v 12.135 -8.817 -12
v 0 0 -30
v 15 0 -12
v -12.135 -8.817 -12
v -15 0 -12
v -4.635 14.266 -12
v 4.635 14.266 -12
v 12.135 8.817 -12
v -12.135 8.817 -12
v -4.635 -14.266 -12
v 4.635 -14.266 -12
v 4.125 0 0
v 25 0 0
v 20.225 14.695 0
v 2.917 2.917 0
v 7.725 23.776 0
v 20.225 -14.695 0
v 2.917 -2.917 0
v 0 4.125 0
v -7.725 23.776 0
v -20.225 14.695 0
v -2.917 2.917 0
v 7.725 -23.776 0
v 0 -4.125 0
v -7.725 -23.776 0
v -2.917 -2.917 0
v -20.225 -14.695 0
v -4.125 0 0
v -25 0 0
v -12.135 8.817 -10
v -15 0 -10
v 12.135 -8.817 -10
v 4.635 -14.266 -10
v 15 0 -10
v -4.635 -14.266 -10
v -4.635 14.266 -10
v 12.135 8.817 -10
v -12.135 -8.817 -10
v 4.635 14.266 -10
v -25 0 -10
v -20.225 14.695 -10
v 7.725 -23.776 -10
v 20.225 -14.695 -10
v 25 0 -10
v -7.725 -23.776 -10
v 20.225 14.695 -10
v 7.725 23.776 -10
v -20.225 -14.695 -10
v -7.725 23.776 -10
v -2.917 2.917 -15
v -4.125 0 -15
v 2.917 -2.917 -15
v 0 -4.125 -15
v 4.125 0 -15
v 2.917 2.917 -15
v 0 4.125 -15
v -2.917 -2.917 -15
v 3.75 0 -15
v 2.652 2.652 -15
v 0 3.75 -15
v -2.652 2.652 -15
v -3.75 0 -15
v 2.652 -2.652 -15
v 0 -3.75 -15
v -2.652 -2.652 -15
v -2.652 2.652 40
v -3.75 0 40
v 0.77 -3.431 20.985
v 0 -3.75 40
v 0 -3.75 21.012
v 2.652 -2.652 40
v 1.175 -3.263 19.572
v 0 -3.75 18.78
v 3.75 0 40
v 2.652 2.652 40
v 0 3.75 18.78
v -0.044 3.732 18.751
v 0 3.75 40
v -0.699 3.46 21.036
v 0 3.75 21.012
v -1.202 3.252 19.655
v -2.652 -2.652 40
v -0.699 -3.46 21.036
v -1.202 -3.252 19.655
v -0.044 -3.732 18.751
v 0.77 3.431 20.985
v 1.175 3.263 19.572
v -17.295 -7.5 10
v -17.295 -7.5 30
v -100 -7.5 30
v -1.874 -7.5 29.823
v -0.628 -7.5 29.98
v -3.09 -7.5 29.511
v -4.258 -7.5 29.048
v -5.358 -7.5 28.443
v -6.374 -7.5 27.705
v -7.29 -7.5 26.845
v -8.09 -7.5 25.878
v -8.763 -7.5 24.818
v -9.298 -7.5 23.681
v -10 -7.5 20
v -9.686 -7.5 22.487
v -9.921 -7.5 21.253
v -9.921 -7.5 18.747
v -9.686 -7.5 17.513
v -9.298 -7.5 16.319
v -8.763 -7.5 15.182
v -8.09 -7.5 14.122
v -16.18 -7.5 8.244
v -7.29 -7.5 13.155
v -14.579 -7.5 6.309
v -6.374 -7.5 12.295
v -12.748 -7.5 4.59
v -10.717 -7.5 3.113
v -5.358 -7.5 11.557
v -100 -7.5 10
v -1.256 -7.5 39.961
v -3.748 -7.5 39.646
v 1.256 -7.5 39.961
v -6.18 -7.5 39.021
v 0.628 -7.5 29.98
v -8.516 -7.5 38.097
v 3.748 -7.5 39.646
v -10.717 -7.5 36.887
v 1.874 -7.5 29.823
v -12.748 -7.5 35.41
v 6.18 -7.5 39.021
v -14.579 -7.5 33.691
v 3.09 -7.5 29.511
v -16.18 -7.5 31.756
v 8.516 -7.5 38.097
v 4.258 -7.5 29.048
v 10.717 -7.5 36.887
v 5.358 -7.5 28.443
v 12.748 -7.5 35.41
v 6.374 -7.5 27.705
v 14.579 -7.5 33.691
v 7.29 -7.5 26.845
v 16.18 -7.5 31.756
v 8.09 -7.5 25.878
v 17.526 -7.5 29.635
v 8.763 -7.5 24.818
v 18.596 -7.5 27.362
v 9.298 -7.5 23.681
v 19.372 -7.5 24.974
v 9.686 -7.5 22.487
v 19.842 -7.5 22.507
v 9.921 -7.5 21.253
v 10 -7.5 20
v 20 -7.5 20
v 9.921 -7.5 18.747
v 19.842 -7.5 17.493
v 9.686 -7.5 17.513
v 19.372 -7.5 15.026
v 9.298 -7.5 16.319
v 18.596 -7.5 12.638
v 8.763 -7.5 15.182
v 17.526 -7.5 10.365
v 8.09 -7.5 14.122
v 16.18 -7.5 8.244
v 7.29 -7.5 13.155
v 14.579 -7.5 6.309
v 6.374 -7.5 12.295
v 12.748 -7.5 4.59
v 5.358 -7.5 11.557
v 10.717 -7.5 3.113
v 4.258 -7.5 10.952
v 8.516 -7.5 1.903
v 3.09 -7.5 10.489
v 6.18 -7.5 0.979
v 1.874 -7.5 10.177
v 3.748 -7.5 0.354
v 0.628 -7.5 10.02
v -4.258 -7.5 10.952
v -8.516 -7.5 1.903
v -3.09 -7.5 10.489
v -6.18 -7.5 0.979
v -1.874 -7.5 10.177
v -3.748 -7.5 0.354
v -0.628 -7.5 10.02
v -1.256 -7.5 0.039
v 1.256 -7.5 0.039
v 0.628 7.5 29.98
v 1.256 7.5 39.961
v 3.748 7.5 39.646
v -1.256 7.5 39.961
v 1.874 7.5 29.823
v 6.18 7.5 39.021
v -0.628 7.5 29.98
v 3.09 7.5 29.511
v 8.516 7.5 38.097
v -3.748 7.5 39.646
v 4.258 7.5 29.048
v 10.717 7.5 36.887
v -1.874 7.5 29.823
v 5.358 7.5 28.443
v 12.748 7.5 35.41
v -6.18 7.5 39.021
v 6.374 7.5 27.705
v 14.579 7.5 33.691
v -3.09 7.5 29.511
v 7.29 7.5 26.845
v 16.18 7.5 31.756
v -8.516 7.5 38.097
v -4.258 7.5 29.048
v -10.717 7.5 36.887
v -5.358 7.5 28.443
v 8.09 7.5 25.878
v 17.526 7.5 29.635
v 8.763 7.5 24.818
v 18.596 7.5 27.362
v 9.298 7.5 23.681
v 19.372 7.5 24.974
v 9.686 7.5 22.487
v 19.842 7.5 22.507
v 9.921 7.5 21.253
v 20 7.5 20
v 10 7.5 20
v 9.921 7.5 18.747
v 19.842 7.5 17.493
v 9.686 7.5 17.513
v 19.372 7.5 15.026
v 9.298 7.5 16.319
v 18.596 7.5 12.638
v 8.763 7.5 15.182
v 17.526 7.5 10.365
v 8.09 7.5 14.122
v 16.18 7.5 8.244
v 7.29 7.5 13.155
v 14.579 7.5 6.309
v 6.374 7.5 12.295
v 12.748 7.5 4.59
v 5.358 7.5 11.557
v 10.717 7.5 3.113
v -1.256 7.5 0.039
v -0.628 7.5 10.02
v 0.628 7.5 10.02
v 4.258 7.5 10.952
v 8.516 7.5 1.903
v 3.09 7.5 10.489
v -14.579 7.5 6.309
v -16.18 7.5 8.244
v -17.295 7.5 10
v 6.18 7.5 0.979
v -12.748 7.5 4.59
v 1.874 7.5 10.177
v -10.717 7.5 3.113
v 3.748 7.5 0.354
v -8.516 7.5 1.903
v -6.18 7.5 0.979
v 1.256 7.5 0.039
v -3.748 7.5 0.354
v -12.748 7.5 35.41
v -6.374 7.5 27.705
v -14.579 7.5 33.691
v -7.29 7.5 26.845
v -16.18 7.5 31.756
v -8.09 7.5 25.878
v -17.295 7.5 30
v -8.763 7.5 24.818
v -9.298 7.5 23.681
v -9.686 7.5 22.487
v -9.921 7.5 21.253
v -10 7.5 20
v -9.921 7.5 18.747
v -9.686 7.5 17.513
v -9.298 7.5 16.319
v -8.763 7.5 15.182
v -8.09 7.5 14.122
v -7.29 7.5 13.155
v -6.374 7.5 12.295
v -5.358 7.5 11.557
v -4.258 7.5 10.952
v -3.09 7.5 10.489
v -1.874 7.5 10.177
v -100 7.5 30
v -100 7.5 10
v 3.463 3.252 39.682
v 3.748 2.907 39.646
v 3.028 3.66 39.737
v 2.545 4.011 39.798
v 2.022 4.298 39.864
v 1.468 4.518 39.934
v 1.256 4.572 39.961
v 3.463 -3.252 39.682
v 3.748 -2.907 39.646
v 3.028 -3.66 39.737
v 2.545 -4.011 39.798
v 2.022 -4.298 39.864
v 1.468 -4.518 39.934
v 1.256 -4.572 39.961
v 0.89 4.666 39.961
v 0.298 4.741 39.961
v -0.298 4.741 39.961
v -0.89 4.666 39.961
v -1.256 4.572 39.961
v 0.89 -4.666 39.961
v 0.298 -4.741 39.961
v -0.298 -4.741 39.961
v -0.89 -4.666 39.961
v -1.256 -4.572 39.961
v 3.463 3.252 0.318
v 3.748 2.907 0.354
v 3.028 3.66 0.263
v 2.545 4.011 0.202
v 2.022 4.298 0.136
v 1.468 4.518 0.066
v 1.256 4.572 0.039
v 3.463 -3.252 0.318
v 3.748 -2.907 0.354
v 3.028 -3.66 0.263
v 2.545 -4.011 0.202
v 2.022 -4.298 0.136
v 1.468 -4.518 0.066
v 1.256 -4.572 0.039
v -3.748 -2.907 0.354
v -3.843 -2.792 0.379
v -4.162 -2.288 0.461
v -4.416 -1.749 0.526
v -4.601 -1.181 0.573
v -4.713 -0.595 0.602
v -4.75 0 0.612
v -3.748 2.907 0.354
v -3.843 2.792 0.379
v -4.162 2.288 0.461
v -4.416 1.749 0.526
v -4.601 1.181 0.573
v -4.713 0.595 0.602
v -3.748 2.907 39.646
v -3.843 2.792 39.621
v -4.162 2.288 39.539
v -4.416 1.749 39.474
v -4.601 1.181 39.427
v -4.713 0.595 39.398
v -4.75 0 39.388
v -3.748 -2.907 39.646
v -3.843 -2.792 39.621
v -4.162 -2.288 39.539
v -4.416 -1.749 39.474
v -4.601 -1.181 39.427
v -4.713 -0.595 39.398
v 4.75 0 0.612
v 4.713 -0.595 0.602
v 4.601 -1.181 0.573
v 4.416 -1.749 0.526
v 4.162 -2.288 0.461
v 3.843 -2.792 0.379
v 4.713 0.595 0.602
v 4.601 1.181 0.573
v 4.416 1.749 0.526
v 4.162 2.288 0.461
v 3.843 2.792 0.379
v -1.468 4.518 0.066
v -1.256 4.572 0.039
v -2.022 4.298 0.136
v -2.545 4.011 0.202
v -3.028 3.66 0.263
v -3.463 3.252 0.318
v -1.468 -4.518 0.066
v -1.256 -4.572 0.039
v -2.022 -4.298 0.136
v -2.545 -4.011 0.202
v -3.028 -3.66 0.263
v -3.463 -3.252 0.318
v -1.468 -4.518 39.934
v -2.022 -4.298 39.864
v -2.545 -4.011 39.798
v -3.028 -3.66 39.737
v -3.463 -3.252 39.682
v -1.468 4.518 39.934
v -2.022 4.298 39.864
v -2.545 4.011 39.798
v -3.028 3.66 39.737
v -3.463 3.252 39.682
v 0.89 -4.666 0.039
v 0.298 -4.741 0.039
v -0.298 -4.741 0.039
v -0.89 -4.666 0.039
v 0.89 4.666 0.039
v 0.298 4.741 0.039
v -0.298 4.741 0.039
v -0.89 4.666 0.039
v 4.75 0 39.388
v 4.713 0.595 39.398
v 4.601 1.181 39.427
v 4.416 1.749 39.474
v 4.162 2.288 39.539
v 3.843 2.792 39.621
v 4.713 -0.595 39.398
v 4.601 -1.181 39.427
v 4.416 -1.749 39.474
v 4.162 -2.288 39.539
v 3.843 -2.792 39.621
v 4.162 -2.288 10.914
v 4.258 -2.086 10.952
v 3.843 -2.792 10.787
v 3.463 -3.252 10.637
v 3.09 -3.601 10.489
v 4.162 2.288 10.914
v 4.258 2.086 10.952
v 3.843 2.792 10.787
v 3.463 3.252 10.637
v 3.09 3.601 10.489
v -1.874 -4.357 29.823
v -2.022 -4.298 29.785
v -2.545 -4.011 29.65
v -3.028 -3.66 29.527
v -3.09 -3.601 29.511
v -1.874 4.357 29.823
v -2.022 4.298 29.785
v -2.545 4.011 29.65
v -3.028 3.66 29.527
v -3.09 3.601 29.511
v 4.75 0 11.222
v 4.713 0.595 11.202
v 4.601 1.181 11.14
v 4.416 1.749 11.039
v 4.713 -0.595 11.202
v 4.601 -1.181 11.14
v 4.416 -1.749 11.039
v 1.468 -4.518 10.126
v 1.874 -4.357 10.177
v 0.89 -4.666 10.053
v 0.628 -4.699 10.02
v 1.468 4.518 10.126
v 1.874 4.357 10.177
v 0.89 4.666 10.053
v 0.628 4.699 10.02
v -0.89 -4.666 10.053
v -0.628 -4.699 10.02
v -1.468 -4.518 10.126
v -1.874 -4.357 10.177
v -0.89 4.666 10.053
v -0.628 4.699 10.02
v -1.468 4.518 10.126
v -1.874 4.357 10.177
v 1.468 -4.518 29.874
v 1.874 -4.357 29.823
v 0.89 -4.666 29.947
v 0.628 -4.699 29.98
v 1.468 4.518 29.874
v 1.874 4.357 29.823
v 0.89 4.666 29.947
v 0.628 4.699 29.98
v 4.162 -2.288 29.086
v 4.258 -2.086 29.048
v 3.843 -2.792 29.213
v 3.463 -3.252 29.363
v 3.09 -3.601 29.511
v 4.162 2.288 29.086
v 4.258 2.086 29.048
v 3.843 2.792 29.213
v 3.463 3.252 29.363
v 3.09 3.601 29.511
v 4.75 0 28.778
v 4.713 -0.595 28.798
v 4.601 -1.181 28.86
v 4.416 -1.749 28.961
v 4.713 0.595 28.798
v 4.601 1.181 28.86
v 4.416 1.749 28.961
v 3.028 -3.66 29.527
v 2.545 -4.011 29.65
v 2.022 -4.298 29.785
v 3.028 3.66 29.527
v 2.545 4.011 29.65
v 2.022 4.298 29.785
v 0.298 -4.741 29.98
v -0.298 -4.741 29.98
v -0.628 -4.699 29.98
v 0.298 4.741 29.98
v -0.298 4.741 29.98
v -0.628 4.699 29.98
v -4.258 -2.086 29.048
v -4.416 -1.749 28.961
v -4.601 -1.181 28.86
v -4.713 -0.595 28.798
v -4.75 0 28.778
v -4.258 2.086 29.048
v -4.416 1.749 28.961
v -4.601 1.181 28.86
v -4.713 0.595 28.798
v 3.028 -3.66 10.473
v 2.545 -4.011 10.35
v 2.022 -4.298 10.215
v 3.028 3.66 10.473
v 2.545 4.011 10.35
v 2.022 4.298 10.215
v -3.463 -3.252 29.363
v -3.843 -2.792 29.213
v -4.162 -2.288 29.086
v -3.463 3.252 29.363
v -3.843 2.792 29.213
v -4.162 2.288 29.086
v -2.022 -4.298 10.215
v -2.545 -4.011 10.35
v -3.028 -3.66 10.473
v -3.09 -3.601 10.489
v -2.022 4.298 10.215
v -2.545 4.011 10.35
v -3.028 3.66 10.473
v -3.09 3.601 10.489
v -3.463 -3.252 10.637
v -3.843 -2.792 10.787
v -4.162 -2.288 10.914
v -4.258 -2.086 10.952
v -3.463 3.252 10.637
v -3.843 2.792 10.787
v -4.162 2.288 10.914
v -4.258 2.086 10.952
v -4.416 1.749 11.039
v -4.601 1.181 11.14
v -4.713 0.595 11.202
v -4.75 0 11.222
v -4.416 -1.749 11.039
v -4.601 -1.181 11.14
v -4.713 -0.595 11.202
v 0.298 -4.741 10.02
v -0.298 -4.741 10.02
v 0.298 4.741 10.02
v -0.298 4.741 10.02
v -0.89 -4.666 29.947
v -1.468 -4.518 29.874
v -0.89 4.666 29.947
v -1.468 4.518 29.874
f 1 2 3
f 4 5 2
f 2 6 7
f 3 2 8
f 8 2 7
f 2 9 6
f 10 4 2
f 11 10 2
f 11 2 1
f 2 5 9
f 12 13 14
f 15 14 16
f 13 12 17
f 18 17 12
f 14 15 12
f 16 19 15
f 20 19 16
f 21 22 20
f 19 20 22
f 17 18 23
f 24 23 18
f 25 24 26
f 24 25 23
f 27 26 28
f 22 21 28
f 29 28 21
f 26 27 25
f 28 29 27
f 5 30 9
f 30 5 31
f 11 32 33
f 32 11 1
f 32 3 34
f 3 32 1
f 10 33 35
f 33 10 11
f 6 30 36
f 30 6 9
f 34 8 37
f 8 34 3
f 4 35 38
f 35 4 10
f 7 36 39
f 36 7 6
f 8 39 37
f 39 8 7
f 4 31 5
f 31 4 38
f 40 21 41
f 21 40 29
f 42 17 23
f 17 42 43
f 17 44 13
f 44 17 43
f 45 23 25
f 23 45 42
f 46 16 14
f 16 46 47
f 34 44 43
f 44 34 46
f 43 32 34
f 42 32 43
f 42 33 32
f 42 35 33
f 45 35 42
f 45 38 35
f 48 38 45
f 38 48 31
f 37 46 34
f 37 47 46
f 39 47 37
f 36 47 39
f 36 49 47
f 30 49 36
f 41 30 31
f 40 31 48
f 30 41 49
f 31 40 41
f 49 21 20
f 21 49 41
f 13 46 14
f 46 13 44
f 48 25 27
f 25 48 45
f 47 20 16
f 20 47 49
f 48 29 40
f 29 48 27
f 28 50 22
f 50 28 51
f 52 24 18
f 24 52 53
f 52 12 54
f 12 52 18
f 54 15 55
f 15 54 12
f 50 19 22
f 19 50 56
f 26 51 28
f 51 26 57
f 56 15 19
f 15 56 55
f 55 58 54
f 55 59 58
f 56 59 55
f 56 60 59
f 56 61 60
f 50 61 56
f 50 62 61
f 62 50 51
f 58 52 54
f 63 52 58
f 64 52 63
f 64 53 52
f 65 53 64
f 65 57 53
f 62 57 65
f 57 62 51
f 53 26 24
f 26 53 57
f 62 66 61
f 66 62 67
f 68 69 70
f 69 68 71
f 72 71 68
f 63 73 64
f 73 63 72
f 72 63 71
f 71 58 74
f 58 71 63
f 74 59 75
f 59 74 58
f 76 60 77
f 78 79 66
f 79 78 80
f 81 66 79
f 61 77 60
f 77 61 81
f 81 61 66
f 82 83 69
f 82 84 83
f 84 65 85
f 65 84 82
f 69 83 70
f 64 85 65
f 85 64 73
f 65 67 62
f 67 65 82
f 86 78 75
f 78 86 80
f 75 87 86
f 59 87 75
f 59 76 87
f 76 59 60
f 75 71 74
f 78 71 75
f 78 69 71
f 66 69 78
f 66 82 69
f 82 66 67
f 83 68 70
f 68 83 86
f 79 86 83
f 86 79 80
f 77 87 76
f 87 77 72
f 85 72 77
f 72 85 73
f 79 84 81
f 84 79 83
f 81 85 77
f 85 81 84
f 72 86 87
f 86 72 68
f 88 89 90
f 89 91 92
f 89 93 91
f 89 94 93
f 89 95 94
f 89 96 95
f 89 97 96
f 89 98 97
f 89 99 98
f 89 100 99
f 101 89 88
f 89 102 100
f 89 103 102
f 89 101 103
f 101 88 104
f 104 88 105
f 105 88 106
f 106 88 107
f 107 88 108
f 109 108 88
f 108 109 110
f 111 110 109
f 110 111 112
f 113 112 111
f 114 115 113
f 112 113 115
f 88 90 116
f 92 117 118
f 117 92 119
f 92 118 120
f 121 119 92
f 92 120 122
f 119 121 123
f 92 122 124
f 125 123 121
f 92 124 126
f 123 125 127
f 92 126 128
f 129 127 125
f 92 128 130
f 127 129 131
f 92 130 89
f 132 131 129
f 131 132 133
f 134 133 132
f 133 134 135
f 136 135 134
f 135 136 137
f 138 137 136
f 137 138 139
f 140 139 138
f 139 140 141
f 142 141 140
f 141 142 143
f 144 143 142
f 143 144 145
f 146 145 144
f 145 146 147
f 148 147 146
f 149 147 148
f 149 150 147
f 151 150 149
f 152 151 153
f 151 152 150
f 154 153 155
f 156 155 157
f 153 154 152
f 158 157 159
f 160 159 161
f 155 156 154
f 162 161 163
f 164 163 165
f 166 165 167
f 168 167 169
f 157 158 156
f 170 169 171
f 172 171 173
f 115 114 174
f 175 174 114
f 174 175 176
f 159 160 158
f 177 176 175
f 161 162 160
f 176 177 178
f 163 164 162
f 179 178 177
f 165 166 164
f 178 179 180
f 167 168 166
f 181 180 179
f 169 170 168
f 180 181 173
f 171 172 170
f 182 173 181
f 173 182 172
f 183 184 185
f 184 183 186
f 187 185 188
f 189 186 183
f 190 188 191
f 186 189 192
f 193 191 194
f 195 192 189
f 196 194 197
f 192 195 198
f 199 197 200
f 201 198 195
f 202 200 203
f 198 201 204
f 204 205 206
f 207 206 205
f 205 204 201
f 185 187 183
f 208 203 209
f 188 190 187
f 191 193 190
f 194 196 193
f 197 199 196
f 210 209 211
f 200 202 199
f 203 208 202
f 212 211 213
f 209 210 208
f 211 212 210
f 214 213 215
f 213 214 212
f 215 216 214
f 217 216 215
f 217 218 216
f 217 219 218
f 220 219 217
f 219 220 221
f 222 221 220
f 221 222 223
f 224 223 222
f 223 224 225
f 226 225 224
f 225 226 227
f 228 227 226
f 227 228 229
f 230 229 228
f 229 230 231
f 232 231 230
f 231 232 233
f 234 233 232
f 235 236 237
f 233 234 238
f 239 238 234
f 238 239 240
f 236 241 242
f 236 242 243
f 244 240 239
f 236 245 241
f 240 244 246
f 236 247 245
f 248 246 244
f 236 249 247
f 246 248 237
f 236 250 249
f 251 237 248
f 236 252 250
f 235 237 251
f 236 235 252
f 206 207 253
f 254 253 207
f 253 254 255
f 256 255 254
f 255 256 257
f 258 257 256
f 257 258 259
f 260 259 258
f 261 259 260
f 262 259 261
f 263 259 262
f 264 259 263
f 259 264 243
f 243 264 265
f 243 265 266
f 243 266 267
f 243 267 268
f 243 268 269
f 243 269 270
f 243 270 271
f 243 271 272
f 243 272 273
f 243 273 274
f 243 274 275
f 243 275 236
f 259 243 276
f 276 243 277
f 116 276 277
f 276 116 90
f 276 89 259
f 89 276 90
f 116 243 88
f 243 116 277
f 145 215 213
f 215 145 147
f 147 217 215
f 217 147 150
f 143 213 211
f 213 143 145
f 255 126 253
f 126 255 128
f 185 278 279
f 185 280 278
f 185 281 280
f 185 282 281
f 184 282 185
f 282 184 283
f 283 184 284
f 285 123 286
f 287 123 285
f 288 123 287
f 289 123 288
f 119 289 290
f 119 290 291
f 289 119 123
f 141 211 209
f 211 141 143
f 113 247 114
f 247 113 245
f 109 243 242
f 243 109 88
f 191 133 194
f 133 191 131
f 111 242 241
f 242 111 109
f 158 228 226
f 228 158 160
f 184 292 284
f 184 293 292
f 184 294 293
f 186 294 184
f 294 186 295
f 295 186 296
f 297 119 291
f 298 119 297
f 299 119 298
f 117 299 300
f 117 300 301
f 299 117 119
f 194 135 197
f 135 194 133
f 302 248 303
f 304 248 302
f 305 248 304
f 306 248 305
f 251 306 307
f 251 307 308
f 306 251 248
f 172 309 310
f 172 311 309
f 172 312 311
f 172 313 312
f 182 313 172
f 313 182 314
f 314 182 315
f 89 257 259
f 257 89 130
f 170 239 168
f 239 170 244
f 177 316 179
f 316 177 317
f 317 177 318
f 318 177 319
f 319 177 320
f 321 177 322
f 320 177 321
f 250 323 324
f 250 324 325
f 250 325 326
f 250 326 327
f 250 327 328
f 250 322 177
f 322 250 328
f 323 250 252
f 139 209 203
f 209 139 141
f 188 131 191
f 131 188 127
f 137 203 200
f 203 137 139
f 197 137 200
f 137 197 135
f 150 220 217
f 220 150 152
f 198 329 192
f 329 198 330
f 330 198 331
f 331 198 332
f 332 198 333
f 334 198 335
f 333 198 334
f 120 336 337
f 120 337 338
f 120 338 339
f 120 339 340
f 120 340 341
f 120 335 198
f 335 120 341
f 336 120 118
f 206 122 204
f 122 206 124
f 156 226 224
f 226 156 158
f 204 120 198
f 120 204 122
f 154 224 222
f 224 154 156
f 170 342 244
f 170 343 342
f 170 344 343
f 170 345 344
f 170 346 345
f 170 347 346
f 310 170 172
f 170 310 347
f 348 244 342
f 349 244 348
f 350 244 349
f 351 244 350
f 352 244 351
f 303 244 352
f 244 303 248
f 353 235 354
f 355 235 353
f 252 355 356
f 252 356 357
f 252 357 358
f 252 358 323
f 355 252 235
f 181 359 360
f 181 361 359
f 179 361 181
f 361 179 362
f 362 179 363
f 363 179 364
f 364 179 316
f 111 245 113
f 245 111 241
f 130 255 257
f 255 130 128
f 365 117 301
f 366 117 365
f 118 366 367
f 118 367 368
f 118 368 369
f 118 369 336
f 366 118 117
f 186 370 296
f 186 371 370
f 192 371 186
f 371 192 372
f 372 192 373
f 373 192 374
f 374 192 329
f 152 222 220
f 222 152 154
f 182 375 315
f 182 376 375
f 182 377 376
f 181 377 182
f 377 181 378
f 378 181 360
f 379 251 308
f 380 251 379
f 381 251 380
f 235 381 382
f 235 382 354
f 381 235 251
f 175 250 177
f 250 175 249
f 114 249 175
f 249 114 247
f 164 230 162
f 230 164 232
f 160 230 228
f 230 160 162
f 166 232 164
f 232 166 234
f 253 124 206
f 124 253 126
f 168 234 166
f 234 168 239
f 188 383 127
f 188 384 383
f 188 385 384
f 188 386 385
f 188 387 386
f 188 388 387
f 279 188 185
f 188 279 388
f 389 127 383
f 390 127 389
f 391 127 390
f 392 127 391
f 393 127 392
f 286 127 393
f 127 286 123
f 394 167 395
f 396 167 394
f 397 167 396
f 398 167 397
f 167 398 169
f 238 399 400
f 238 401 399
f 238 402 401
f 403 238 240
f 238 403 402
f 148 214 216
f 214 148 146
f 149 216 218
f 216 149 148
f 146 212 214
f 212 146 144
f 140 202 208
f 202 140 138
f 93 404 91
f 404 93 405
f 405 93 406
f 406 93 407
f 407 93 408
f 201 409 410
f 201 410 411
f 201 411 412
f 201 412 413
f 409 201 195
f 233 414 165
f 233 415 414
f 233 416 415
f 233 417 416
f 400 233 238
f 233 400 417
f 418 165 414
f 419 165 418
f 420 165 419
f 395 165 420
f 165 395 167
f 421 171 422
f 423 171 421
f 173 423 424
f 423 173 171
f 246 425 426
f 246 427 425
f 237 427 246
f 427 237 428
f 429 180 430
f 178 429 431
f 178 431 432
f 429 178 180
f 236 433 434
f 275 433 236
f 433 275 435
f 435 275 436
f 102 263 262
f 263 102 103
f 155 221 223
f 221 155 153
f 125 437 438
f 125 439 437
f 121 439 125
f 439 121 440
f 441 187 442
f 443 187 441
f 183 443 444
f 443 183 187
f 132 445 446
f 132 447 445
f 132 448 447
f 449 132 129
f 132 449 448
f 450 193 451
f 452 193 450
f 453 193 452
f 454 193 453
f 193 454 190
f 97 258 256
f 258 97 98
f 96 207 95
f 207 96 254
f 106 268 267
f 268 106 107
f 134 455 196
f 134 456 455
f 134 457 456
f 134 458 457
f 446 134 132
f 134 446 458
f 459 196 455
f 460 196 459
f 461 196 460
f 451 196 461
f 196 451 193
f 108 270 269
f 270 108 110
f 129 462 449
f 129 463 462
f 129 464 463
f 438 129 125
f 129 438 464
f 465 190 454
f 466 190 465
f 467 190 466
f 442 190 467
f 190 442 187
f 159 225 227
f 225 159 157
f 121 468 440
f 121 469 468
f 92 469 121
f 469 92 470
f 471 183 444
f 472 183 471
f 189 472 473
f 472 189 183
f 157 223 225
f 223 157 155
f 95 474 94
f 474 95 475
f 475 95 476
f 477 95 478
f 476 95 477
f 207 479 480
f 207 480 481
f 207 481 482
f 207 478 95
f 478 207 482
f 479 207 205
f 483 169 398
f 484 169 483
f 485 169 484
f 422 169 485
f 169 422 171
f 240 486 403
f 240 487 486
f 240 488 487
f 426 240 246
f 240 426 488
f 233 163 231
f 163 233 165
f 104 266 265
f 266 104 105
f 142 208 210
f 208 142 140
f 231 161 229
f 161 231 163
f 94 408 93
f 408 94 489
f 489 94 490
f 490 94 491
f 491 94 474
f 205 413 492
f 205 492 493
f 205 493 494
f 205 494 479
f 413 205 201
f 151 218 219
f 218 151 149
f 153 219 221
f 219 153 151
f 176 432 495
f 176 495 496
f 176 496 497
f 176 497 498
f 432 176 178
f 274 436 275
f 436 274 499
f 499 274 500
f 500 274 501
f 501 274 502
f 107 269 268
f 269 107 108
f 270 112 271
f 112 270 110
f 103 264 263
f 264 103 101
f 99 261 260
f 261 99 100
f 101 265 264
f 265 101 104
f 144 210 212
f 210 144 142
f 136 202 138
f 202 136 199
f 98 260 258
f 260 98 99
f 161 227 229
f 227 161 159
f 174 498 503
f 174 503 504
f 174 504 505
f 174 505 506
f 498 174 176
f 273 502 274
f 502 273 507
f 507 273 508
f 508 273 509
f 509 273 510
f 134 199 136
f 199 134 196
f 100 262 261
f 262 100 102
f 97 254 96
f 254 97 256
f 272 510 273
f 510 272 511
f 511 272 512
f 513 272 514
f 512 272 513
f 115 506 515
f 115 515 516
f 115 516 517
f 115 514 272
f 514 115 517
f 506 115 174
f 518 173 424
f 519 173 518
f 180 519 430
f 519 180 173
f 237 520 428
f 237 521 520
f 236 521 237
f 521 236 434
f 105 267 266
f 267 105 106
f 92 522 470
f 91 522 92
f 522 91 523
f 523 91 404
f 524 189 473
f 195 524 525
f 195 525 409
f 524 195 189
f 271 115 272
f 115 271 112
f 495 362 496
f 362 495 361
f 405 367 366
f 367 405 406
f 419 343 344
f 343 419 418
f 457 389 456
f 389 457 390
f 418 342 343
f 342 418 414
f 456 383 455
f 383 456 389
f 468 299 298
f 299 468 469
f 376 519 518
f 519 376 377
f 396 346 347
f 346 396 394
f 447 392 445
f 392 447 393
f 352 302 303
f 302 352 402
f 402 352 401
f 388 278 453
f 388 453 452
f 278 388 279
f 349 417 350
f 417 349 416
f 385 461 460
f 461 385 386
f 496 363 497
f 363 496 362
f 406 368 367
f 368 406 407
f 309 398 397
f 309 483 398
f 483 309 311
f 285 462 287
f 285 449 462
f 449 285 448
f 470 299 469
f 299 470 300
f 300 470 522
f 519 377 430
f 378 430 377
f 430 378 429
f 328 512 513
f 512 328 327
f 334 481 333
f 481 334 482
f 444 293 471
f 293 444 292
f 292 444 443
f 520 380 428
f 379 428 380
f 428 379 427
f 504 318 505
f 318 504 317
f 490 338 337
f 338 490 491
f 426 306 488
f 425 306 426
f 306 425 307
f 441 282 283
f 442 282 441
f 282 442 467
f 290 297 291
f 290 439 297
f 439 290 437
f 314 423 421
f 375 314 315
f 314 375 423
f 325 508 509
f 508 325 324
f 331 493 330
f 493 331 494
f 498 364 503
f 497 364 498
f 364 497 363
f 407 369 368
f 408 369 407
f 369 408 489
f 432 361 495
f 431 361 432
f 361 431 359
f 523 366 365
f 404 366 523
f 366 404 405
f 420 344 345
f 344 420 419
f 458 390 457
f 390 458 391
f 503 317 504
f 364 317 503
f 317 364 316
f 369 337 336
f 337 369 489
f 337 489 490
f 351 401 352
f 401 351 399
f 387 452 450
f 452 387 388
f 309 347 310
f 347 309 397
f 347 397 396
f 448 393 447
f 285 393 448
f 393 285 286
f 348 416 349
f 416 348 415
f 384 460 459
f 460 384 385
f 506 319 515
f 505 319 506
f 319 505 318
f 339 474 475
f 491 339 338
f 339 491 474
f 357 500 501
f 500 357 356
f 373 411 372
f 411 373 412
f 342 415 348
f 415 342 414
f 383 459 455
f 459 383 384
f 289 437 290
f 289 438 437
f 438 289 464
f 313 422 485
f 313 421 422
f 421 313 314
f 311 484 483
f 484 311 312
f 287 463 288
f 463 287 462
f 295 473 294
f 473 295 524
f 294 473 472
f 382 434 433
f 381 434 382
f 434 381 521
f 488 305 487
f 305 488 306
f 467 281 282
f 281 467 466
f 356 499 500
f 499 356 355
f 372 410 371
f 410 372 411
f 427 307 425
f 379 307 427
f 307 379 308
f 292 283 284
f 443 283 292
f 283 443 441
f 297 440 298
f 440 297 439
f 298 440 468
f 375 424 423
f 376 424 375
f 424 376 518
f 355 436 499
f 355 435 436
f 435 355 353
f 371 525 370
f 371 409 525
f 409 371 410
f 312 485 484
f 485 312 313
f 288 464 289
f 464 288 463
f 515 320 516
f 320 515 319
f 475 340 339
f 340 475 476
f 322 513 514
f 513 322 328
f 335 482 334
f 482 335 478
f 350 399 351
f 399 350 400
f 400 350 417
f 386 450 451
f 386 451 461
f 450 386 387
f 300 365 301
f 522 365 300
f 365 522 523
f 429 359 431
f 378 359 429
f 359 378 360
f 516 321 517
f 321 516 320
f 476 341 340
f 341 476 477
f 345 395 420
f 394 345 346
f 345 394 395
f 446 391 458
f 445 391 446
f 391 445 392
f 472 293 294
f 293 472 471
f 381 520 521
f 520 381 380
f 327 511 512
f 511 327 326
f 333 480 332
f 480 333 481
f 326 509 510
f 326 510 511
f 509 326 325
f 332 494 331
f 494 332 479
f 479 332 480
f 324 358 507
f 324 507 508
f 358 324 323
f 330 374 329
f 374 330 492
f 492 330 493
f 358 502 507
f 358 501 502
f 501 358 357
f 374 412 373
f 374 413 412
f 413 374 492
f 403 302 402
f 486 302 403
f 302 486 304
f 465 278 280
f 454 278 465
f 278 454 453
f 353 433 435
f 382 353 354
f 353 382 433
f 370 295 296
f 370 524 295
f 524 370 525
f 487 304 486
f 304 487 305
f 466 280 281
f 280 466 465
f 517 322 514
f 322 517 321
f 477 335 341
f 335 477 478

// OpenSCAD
// [FL_INDEX: keywords="openscad, 3d_parametric, Customizable_pull_string_top, csg_solid" | COT="Parametric OpenSCAD design from 3DCodeverse"]
// Title: Customizable pull string top

/*[top dimensions]*/
//Show assembled
assembled=1; //[1:yes, 0:no]
stem_height=40;
stem_dia=7.5;
stem_dia_tol=.75;
stem_facets=8;
stem_hole_dia=2.5;
stem_hole_offset=stem_height/2;

base_height=30;
base_dia=50;
base_facets=10;
base_chamfer=10;
base_ring_dia=50;
base_ring_height=10;

/*[handle dimensions]*/
handle_length=100;
handle_thick=stem_dia*2;
handle_width=20;
hole_edge=10;
shaft_tol=1;


top();
if(assembled==0)
translate([0,handle_width+base_dia/2+base_ring_dia/2,0])
handle();
if(assembled==1)
translate([-handle_length/2,0,stem_height/2])
	rotate([90,0,0])
		handle();


module top(){
	if (assembled==1){
		union(){
			rotate([180,0,0])
				base();
			translate([0,0,stem_height])
				rotate([180,0,0])
					stem();
		}
	}
	if(assembled==0){
		base();
		translate([base_ring_dia/2+base_dia/2+stem_dia,0,0])
			stem();

	}

}

module handle(){
	difference(){
		union(){
			cube([handle_length,handle_width,handle_thick],center=true);
			translate([handle_length/2,0,0])
				cylinder(r=stem_height/2,h=handle_thick,$fn=50,center=true);
		}
		translate([handle_length/2,0,0])
			cylinder(r=stem_height/2-hole_edge,h=handle_thick*1.1,$fn=50,center=true);
		translate([handle_length/2,0,0])
			rotate([90,0,0])
				cylinder(r=stem_dia/2+shaft_tol,h=stem_height*1.1,center=true,$fn=50);
		//for(i=[-handle_length/2
	}
}

module base(){
	difference(){
		union(){
			intersection(){
				cylinder(r1=base_dia/2,r2=0,h=base_height,$fn=base_facets);
				cylinder(r=base_dia/2-base_chamfer,h=base_height,$fn=base_facets);
			}
			cylinder(r=base_ring_dia/2,h=base_ring_height,$fn=base_facets);
		}
		cylinder(r=stem_dia/2+stem_dia_tol/2,h=base_height/2,$fn=stem_facets);
	}
	
}

module stem(){
	difference(){
		cylinder(r=stem_dia/2,h=stem_height+base_height/2,$fn=stem_facets);
		translate([0,0,stem_hole_offset])
			rotate([90,-20,0])
				cylinder(r=stem_hole_dia/2,h=stem_dia*1.5,$fn=5,center=true);
	}


}
